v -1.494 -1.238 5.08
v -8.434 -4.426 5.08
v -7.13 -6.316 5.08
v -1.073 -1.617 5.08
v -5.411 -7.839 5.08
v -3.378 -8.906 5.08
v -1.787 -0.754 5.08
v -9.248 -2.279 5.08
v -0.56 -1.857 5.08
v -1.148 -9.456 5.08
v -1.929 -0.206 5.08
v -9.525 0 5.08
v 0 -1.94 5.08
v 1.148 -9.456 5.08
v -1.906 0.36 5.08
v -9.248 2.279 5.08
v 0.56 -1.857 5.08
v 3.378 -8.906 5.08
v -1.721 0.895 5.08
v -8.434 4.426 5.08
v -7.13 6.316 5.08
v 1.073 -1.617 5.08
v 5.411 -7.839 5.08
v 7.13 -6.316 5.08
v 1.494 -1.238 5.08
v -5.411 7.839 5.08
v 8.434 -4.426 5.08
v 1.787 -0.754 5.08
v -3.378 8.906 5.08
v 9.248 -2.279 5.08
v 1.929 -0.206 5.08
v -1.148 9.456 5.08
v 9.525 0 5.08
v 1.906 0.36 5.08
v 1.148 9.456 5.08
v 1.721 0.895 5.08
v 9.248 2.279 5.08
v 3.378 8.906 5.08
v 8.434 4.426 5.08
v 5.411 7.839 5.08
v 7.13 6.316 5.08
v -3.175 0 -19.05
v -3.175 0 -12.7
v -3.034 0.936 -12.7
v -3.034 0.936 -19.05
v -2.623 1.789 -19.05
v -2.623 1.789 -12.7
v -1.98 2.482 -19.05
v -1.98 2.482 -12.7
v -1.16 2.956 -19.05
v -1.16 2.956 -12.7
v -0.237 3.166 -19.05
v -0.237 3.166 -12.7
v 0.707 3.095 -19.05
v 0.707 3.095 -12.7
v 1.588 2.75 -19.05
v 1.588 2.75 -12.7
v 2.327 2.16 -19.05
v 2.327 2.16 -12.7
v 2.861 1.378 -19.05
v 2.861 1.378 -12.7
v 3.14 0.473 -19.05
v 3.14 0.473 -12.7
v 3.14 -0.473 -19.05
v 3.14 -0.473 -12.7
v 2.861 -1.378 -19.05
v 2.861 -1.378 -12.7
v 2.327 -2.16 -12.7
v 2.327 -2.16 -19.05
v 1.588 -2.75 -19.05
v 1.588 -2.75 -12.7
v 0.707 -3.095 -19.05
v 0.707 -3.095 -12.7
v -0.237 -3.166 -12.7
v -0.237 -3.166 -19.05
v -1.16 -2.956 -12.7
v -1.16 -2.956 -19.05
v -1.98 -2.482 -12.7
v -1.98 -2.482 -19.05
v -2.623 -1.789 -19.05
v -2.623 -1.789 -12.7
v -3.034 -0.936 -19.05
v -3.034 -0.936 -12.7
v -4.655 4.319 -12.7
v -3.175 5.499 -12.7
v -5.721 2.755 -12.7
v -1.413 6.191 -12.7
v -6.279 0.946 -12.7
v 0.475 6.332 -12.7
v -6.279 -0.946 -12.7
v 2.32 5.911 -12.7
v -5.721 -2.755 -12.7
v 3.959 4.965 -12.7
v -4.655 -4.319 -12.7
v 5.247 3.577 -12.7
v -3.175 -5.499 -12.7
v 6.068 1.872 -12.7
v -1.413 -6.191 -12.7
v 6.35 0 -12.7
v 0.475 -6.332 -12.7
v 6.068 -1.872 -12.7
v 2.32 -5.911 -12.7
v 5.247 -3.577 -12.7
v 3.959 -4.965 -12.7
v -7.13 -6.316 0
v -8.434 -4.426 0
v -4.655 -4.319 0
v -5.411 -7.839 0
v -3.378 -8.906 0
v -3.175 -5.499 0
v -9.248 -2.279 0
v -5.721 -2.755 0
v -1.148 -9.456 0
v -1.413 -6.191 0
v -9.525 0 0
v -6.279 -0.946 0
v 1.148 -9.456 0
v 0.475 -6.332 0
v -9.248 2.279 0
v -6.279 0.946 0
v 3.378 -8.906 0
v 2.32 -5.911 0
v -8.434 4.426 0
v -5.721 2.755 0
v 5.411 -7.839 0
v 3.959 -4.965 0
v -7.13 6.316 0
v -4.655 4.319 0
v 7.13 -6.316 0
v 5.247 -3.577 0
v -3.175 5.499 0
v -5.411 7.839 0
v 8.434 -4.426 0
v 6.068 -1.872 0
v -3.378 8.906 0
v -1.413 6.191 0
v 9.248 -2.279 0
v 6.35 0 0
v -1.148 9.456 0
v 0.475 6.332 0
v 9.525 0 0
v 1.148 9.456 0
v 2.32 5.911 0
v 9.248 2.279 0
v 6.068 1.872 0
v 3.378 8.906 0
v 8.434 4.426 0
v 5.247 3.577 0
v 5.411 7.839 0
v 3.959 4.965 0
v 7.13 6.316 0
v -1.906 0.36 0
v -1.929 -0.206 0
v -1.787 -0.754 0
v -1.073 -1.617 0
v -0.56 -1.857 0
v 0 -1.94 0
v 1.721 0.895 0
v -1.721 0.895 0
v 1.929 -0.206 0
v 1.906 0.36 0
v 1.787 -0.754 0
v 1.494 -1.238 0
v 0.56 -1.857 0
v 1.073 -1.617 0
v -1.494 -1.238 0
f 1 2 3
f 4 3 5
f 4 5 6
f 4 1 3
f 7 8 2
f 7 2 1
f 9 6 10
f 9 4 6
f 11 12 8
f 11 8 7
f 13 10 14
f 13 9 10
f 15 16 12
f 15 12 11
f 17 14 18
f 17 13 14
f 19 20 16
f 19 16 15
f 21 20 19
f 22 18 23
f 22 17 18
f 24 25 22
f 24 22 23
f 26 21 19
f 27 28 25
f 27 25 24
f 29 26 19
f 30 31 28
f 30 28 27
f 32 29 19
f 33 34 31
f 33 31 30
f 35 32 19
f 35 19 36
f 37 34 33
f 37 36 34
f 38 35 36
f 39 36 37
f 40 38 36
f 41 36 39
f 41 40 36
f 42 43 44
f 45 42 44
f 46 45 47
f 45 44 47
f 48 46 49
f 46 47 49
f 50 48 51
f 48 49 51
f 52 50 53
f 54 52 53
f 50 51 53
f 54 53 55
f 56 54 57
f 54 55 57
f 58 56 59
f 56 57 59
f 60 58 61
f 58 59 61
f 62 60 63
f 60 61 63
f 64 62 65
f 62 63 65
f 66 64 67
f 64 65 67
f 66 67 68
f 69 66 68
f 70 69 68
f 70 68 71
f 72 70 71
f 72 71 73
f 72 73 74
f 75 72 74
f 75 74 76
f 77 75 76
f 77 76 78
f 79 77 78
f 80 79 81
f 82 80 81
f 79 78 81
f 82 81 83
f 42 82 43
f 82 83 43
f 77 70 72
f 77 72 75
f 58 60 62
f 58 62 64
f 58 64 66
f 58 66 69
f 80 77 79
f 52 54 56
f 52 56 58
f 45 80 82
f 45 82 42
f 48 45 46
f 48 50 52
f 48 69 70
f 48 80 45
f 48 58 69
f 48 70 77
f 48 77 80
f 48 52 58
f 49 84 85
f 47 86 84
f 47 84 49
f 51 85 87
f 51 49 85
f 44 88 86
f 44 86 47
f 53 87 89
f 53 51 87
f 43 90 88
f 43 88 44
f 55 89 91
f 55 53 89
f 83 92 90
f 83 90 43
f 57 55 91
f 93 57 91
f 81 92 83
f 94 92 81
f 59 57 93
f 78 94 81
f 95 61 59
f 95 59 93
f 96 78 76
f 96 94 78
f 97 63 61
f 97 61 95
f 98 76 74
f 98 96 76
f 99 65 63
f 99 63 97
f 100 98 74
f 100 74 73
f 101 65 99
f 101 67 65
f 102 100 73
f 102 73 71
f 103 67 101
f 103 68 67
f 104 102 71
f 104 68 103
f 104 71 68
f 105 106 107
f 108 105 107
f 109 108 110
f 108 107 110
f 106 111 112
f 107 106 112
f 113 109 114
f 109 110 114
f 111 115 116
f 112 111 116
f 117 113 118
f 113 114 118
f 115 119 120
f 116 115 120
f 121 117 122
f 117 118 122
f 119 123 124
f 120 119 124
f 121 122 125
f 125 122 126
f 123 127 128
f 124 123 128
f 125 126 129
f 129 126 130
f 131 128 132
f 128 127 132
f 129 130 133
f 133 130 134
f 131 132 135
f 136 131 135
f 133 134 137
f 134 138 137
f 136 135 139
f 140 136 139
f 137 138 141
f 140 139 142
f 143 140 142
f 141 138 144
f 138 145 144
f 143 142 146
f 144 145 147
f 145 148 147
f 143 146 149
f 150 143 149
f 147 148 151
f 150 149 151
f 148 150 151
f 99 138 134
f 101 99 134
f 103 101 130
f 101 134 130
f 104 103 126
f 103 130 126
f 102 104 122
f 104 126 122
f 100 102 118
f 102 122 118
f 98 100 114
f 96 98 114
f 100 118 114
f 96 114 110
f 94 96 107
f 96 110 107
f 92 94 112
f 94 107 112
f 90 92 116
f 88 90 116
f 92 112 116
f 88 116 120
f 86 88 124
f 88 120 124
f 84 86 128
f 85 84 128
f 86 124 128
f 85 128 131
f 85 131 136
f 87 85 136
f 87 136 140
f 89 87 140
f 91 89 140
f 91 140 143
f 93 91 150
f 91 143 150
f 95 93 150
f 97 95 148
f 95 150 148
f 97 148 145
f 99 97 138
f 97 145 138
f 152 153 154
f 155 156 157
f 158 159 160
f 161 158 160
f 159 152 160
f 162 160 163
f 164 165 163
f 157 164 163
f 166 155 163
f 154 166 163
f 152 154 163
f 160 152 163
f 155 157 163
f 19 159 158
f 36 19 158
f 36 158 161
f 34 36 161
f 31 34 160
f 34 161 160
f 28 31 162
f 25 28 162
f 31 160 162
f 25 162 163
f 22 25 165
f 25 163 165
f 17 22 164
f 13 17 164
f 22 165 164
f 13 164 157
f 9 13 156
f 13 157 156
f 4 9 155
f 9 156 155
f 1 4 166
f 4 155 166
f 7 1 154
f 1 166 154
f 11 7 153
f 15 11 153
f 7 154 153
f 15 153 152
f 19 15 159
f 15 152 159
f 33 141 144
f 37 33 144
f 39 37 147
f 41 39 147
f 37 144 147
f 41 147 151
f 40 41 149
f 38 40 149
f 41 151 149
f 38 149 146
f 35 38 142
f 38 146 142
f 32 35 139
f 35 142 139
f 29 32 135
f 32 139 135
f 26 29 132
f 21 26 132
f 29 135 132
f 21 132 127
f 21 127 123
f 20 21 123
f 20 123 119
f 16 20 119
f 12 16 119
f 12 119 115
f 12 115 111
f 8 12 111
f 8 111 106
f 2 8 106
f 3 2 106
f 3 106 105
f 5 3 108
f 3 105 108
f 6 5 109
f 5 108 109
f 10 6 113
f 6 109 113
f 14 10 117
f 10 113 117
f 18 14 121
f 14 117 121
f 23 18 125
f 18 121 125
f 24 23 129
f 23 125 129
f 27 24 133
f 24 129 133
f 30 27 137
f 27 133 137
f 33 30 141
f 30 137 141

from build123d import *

# Parameters (mm, degrees)
SKETCH1_R           = 9.525
BOSS_EXTRUDE1_DEPTH = 5.08
SKETCH2_R           = 6.35
BOSS_EXTRUDE2_DEPTH = 12.7
SKETCH3_R           = 3.175
BOSS_EXTRUDE3_DEPTH = 6.35


with BuildPart() as part:
    # Sketch1 → Boss-Extrude1 (new body)
    with BuildSketch(Plane.XY):
        Circle(SKETCH1_R)
        with BuildLine():
            Line((-1.721227803, 0.894971982), (1.721227803, 0.894971982))
            ThreePointArc((1.721227803, 0.894971982), (0, -1.94), (-1.721227803, 0.894971982))
        make_face(mode=Mode.SUBTRACT)
    extrude(amount=BOSS_EXTRUDE1_DEPTH)

    # Sketch2 → Boss-Extrude2 (add)
    with BuildSketch(Plane(origin=(0, 0, 0), x_dir=(-1, 0, 0), z_dir=(0, 0, -1))):
        with Locations(Location((0, 0, 0), (0, 0, 180))):
            Circle(SKETCH2_R)
    extrude(amount=BOSS_EXTRUDE2_DEPTH)

    # Sketch3 → Boss-Extrude3 (add)
    with BuildSketch(Plane(origin=(0, 0, -12.7), x_dir=(-1, 0, 0), z_dir=(0, 0, -1))):
        Circle(SKETCH3_R)
    extrude(amount=BOSS_EXTRUDE3_DEPTH)


solid = part.part
